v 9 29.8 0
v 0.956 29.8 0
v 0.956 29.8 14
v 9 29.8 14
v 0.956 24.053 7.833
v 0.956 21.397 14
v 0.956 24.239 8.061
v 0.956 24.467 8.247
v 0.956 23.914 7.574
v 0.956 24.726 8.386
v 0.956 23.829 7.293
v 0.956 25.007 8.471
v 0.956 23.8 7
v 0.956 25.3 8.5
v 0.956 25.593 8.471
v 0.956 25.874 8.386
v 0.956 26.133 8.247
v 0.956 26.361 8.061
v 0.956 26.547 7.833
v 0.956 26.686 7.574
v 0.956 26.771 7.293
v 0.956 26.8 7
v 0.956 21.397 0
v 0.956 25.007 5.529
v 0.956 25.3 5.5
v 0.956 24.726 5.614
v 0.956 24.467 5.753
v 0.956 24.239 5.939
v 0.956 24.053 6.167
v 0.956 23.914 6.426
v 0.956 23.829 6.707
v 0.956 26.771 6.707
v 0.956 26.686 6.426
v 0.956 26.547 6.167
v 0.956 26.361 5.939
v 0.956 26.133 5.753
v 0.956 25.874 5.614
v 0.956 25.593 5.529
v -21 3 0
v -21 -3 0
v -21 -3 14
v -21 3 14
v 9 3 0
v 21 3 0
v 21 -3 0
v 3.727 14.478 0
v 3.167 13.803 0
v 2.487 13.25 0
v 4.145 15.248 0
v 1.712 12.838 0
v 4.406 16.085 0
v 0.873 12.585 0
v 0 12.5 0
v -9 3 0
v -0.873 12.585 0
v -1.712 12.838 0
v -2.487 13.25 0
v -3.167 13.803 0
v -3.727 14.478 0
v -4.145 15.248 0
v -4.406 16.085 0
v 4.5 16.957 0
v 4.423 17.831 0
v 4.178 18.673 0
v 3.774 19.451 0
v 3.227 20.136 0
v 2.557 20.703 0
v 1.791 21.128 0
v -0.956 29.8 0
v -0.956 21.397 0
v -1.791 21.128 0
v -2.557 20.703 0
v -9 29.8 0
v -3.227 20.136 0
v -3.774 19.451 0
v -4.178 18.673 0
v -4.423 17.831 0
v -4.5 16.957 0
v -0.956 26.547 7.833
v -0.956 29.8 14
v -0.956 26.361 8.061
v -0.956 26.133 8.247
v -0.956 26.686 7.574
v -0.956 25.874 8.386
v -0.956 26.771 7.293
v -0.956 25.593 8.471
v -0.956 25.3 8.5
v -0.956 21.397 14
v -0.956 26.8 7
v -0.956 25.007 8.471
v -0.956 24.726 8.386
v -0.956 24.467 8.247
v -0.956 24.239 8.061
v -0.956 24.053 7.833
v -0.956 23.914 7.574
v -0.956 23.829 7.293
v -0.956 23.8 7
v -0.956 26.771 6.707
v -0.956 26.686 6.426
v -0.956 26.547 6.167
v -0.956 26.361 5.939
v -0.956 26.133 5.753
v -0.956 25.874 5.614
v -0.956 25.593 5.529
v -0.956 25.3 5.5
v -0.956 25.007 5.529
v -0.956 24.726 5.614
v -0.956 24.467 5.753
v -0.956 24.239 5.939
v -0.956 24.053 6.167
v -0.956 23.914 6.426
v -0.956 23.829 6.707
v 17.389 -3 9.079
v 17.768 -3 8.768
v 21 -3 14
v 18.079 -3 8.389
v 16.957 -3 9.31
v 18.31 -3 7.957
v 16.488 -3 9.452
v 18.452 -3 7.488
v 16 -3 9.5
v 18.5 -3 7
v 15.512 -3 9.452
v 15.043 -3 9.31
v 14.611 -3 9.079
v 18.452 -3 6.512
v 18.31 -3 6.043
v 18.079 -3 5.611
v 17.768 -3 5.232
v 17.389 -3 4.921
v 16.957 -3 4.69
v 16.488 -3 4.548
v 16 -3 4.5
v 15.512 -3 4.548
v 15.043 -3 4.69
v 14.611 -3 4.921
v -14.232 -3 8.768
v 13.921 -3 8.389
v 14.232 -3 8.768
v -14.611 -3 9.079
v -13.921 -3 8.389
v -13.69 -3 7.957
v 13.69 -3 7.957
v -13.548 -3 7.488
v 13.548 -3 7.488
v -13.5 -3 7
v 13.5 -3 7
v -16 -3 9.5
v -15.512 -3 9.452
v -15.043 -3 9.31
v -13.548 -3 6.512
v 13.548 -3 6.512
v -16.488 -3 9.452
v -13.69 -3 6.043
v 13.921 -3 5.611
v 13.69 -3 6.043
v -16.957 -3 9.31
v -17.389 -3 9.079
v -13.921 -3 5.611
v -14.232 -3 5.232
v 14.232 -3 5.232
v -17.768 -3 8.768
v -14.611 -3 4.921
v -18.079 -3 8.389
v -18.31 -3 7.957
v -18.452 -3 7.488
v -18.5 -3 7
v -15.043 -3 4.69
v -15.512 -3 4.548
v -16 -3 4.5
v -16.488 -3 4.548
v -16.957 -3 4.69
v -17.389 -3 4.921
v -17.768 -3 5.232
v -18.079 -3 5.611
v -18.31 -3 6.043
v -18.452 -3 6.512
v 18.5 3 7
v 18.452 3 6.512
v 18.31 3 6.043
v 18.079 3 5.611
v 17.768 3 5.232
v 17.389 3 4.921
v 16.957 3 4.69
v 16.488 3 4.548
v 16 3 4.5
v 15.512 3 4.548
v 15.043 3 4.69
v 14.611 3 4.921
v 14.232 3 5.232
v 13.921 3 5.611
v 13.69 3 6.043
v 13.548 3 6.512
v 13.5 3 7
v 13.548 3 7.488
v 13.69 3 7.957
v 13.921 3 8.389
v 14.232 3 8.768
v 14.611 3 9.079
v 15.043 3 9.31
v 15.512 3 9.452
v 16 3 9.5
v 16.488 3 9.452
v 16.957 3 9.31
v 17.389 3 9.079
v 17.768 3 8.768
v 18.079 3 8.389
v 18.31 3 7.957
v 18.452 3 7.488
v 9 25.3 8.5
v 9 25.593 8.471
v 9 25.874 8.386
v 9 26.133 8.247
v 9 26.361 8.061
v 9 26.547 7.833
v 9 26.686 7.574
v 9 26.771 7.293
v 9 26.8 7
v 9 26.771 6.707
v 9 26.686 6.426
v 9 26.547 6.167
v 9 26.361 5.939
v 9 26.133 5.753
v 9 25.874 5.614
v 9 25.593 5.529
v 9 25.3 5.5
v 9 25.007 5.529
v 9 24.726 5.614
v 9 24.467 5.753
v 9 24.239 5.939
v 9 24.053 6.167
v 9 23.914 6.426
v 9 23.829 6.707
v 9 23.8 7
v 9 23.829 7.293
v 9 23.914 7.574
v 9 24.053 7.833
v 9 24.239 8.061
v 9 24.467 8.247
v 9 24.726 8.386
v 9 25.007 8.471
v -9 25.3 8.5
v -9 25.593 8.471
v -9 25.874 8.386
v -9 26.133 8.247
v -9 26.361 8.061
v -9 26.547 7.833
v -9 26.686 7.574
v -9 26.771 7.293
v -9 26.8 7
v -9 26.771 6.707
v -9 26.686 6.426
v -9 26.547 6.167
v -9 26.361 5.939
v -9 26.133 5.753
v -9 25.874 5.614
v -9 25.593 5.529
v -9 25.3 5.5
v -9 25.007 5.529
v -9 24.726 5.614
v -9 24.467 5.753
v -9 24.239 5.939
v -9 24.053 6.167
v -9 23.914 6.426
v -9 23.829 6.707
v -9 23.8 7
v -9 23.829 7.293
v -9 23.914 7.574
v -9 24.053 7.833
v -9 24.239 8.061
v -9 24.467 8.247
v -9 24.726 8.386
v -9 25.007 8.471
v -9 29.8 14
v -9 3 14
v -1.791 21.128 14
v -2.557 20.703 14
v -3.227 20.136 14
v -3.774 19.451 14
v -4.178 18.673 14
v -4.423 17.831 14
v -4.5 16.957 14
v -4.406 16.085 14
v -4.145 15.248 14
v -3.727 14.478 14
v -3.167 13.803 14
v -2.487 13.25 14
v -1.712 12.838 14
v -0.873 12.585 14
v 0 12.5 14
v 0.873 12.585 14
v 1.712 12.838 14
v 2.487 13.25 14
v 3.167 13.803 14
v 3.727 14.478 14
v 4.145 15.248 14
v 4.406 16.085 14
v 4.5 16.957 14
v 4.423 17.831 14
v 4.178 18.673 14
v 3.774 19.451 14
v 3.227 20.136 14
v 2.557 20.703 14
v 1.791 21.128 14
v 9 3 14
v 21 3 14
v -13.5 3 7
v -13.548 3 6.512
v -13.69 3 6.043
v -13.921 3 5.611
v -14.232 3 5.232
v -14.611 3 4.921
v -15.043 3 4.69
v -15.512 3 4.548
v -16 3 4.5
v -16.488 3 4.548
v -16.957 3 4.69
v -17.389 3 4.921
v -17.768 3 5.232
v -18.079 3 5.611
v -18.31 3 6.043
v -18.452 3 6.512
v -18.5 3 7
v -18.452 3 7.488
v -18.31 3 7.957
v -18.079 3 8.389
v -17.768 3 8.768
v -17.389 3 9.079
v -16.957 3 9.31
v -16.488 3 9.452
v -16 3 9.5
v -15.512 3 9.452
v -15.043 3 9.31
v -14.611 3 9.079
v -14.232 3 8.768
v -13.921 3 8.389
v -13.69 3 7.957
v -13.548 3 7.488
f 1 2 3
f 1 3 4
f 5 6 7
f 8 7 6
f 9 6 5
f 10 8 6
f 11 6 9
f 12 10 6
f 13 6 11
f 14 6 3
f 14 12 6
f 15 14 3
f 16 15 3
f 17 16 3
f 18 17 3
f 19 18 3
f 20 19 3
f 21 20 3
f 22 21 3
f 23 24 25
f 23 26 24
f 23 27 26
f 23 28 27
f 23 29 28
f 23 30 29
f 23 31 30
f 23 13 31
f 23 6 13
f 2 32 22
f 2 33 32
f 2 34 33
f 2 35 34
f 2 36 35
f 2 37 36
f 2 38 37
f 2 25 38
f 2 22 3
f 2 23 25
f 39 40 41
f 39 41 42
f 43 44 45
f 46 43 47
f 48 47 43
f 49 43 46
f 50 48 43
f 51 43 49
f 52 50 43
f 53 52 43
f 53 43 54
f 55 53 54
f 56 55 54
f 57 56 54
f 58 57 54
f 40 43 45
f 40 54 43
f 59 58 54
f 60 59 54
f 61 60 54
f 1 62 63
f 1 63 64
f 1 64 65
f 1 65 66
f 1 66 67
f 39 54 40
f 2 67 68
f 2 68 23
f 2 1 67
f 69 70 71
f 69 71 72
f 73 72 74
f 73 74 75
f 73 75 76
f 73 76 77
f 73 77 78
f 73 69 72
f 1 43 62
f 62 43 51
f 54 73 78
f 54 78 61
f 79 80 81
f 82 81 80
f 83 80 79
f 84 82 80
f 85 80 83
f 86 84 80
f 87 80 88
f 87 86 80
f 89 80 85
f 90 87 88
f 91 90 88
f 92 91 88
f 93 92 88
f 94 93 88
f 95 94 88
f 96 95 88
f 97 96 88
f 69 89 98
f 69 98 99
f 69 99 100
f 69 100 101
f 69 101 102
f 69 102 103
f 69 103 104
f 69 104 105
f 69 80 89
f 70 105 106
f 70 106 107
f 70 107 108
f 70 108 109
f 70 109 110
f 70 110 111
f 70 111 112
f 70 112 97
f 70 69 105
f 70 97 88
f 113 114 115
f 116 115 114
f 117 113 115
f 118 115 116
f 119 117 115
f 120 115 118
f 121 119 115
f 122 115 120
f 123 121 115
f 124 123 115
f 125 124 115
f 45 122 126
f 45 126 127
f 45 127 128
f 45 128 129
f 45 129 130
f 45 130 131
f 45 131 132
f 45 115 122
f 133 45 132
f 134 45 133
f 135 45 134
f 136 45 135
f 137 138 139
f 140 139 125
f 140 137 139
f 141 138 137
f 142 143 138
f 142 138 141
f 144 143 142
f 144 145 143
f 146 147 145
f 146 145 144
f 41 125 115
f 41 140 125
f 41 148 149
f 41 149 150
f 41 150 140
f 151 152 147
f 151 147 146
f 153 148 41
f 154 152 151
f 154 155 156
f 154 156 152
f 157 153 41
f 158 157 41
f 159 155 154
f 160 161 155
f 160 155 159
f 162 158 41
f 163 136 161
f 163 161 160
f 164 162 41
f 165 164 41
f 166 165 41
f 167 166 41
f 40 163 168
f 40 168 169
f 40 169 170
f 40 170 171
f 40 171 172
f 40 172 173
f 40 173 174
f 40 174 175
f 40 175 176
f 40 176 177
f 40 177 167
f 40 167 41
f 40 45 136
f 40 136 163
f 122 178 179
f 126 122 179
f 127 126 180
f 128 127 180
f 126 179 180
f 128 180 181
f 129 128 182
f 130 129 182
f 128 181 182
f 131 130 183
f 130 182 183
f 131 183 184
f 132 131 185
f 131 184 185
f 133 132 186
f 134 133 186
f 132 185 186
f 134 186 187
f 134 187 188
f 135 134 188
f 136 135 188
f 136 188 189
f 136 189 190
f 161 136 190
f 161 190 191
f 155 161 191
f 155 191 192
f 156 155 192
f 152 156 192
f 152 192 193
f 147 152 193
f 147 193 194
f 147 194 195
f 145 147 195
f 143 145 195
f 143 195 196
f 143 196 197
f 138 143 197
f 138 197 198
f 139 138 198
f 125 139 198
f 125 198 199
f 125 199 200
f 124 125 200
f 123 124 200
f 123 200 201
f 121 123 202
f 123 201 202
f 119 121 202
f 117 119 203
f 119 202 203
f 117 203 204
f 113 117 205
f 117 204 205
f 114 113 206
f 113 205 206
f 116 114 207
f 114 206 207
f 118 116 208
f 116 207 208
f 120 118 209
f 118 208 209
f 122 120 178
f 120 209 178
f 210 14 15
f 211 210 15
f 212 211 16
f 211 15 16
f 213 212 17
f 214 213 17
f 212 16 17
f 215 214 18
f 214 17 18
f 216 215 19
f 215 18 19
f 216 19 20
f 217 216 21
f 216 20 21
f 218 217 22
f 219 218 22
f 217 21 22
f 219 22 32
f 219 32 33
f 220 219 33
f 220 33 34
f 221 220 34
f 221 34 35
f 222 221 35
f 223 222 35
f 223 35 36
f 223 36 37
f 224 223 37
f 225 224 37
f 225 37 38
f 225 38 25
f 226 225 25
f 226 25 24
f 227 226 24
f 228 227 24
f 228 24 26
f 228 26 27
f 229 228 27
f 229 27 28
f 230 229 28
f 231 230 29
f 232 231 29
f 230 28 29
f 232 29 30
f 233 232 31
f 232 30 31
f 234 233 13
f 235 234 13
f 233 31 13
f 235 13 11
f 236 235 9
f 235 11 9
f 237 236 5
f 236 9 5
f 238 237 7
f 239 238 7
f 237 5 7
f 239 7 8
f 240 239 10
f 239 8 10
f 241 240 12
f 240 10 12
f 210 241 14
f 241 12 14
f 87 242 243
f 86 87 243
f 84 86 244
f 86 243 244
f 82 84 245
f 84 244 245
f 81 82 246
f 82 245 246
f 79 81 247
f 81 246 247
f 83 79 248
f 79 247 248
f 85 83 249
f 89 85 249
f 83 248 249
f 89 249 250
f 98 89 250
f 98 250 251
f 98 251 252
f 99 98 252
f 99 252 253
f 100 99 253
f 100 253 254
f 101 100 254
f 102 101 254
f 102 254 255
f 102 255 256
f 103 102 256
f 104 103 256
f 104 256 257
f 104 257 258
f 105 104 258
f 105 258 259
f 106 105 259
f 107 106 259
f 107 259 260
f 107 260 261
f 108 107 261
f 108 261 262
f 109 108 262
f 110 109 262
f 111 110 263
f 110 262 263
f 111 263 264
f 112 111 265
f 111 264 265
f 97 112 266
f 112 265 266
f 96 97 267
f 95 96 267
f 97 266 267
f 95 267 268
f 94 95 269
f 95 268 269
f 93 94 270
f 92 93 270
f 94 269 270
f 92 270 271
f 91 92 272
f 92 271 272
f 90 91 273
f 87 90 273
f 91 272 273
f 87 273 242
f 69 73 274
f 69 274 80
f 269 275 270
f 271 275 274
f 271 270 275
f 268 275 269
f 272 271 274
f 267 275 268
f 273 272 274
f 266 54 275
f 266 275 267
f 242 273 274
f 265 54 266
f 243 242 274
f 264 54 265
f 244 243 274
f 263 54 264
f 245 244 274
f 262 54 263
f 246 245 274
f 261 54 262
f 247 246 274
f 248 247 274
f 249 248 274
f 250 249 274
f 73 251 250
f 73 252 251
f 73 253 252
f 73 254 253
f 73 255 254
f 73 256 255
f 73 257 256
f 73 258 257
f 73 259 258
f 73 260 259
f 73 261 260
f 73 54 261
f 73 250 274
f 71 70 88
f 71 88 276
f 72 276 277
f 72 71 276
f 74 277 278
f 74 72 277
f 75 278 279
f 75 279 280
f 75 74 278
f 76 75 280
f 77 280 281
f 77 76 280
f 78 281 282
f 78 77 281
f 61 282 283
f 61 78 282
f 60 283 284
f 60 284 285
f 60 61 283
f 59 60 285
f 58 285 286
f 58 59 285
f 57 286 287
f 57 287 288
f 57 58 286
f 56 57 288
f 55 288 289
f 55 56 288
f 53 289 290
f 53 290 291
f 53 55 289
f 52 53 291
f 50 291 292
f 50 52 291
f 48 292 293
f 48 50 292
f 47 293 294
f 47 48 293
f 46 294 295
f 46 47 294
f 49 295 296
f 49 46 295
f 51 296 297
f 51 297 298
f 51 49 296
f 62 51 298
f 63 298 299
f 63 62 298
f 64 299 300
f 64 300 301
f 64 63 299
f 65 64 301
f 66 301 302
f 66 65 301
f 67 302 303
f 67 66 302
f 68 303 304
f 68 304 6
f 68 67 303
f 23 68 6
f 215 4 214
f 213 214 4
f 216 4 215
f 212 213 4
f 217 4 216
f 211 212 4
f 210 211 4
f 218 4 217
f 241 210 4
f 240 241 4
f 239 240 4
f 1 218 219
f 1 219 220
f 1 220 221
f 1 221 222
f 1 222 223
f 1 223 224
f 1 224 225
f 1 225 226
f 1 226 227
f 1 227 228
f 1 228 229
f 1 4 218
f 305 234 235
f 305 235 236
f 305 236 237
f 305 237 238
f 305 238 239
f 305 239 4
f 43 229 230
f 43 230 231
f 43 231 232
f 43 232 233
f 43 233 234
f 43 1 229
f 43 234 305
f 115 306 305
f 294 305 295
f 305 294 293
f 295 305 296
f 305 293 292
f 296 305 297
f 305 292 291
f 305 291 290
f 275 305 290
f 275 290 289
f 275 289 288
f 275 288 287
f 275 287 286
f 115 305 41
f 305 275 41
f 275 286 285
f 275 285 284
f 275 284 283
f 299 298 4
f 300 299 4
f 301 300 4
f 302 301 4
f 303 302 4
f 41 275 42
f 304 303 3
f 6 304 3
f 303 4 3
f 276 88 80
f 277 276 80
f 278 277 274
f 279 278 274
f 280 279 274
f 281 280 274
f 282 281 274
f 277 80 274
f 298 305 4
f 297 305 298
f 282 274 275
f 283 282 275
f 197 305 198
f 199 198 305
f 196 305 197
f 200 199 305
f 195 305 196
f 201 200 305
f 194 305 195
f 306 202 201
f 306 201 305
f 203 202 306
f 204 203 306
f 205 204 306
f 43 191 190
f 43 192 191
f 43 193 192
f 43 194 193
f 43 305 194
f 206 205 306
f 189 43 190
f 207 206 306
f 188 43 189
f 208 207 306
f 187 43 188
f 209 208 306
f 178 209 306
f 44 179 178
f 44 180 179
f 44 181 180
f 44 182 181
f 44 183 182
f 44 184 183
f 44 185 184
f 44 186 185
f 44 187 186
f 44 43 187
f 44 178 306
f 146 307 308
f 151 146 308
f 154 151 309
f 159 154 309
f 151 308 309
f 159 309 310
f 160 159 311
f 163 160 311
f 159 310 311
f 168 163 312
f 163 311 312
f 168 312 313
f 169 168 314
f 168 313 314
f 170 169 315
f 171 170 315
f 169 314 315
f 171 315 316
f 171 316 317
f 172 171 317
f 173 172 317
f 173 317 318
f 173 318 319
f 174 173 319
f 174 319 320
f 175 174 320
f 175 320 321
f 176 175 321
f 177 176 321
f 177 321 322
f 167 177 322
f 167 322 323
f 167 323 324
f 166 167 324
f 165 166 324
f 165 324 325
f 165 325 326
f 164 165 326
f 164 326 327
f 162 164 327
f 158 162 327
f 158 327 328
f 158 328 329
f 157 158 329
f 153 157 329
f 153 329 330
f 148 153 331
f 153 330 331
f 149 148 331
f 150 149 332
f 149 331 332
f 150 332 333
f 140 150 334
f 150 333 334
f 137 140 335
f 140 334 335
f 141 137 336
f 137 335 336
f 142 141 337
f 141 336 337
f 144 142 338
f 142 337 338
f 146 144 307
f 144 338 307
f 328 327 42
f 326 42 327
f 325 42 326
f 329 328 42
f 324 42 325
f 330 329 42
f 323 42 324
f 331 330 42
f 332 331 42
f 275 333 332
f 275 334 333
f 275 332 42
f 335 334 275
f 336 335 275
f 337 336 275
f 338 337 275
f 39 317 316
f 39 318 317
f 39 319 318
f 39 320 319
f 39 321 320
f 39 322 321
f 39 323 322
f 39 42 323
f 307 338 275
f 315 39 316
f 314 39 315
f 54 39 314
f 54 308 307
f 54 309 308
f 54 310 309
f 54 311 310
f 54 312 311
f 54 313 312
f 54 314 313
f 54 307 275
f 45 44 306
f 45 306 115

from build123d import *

# Parameters (mm, degrees)
BOSS_EXTRUDE1_DEPTH = 14
CUT_EXTRUDE1_REACH  = 8
SKETCH2_R           = 2.5
SKETCH3_R           = 1.5
CUT_EXTRUDE2_DEPTH  = 31


with BuildPart() as part:
    # Sketch1 → Boss-Extrude1 (new body)
    with BuildSketch(Plane.XY):
        with BuildLine():
            Line((-0.95630186, 29.8), (-0.95630186, 21.397213521))
            ThreePointArc((-0.95630186, 21.397213521), (0, 12.5), (0.95630186, 21.397213521))
            Line((0.95630186, 21.397213521), (0.95630186, 29.8))
            Line((0.95630186, 29.8), (9, 29.8))
            Line((9, 29.8), (9, 3))
            Line((9, 3), (21, 3))
            Line((21, 3), (21, -3))
            Line((21, -3), (-21, -3))
            Line((-21, -3), (-21, 3))
            Line((-21, 3), (-9, 3))
            Line((-9, 3), (-9, 29.8))
            Line((-9, 29.8), (-0.95630186, 29.8))
        make_face()
    extrude(amount=BOSS_EXTRUDE1_DEPTH)

    # Sketch2 → Cut-Extrude1 (cut, up to next)
    with BuildSketch(Plane(origin=(0, 3, 0), x_dir=(1, 0, 0), z_dir=(0, 1, 0)), mode=Mode.PRIVATE) as cut_extrude1_sk1:
        with Locations((-16, -7)):
            Circle(SKETCH2_R)
    cut_extrude1_tool1 = extrude(cut_extrude1_sk1.sketch, amount=-CUT_EXTRUDE1_REACH, mode=Mode.PRIVATE) & part.part
    add(cut_extrude1_tool1.solids().sort_by_distance((-16, 3, 7))[0], mode=Mode.SUBTRACT)
    # Sketch2 → Cut-Extrude1 (cut, up to next)
    with BuildSketch(Plane(origin=(0, 3, 0), x_dir=(1, 0, 0), z_dir=(0, 1, 0)), mode=Mode.PRIVATE) as cut_extrude1_sk2:
        with Locations((16, -7)):
            Circle(SKETCH2_R)
    cut_extrude1_tool2 = extrude(cut_extrude1_sk2.sketch, amount=-CUT_EXTRUDE1_REACH, mode=Mode.PRIVATE) & part.part
    add(cut_extrude1_tool2.solids().sort_by_distance((16, 3, 7))[0], mode=Mode.SUBTRACT)

    # Sketch3 → Cut-Extrude2 (cut, through all)
    with BuildSketch(Plane.ZY.offset(9)):
        with Locations((7, 25.3)):
            Circle(SKETCH3_R)
    extrude(amount=-CUT_EXTRUDE2_DEPTH, mode=Mode.SUBTRACT)


solid = part.part
